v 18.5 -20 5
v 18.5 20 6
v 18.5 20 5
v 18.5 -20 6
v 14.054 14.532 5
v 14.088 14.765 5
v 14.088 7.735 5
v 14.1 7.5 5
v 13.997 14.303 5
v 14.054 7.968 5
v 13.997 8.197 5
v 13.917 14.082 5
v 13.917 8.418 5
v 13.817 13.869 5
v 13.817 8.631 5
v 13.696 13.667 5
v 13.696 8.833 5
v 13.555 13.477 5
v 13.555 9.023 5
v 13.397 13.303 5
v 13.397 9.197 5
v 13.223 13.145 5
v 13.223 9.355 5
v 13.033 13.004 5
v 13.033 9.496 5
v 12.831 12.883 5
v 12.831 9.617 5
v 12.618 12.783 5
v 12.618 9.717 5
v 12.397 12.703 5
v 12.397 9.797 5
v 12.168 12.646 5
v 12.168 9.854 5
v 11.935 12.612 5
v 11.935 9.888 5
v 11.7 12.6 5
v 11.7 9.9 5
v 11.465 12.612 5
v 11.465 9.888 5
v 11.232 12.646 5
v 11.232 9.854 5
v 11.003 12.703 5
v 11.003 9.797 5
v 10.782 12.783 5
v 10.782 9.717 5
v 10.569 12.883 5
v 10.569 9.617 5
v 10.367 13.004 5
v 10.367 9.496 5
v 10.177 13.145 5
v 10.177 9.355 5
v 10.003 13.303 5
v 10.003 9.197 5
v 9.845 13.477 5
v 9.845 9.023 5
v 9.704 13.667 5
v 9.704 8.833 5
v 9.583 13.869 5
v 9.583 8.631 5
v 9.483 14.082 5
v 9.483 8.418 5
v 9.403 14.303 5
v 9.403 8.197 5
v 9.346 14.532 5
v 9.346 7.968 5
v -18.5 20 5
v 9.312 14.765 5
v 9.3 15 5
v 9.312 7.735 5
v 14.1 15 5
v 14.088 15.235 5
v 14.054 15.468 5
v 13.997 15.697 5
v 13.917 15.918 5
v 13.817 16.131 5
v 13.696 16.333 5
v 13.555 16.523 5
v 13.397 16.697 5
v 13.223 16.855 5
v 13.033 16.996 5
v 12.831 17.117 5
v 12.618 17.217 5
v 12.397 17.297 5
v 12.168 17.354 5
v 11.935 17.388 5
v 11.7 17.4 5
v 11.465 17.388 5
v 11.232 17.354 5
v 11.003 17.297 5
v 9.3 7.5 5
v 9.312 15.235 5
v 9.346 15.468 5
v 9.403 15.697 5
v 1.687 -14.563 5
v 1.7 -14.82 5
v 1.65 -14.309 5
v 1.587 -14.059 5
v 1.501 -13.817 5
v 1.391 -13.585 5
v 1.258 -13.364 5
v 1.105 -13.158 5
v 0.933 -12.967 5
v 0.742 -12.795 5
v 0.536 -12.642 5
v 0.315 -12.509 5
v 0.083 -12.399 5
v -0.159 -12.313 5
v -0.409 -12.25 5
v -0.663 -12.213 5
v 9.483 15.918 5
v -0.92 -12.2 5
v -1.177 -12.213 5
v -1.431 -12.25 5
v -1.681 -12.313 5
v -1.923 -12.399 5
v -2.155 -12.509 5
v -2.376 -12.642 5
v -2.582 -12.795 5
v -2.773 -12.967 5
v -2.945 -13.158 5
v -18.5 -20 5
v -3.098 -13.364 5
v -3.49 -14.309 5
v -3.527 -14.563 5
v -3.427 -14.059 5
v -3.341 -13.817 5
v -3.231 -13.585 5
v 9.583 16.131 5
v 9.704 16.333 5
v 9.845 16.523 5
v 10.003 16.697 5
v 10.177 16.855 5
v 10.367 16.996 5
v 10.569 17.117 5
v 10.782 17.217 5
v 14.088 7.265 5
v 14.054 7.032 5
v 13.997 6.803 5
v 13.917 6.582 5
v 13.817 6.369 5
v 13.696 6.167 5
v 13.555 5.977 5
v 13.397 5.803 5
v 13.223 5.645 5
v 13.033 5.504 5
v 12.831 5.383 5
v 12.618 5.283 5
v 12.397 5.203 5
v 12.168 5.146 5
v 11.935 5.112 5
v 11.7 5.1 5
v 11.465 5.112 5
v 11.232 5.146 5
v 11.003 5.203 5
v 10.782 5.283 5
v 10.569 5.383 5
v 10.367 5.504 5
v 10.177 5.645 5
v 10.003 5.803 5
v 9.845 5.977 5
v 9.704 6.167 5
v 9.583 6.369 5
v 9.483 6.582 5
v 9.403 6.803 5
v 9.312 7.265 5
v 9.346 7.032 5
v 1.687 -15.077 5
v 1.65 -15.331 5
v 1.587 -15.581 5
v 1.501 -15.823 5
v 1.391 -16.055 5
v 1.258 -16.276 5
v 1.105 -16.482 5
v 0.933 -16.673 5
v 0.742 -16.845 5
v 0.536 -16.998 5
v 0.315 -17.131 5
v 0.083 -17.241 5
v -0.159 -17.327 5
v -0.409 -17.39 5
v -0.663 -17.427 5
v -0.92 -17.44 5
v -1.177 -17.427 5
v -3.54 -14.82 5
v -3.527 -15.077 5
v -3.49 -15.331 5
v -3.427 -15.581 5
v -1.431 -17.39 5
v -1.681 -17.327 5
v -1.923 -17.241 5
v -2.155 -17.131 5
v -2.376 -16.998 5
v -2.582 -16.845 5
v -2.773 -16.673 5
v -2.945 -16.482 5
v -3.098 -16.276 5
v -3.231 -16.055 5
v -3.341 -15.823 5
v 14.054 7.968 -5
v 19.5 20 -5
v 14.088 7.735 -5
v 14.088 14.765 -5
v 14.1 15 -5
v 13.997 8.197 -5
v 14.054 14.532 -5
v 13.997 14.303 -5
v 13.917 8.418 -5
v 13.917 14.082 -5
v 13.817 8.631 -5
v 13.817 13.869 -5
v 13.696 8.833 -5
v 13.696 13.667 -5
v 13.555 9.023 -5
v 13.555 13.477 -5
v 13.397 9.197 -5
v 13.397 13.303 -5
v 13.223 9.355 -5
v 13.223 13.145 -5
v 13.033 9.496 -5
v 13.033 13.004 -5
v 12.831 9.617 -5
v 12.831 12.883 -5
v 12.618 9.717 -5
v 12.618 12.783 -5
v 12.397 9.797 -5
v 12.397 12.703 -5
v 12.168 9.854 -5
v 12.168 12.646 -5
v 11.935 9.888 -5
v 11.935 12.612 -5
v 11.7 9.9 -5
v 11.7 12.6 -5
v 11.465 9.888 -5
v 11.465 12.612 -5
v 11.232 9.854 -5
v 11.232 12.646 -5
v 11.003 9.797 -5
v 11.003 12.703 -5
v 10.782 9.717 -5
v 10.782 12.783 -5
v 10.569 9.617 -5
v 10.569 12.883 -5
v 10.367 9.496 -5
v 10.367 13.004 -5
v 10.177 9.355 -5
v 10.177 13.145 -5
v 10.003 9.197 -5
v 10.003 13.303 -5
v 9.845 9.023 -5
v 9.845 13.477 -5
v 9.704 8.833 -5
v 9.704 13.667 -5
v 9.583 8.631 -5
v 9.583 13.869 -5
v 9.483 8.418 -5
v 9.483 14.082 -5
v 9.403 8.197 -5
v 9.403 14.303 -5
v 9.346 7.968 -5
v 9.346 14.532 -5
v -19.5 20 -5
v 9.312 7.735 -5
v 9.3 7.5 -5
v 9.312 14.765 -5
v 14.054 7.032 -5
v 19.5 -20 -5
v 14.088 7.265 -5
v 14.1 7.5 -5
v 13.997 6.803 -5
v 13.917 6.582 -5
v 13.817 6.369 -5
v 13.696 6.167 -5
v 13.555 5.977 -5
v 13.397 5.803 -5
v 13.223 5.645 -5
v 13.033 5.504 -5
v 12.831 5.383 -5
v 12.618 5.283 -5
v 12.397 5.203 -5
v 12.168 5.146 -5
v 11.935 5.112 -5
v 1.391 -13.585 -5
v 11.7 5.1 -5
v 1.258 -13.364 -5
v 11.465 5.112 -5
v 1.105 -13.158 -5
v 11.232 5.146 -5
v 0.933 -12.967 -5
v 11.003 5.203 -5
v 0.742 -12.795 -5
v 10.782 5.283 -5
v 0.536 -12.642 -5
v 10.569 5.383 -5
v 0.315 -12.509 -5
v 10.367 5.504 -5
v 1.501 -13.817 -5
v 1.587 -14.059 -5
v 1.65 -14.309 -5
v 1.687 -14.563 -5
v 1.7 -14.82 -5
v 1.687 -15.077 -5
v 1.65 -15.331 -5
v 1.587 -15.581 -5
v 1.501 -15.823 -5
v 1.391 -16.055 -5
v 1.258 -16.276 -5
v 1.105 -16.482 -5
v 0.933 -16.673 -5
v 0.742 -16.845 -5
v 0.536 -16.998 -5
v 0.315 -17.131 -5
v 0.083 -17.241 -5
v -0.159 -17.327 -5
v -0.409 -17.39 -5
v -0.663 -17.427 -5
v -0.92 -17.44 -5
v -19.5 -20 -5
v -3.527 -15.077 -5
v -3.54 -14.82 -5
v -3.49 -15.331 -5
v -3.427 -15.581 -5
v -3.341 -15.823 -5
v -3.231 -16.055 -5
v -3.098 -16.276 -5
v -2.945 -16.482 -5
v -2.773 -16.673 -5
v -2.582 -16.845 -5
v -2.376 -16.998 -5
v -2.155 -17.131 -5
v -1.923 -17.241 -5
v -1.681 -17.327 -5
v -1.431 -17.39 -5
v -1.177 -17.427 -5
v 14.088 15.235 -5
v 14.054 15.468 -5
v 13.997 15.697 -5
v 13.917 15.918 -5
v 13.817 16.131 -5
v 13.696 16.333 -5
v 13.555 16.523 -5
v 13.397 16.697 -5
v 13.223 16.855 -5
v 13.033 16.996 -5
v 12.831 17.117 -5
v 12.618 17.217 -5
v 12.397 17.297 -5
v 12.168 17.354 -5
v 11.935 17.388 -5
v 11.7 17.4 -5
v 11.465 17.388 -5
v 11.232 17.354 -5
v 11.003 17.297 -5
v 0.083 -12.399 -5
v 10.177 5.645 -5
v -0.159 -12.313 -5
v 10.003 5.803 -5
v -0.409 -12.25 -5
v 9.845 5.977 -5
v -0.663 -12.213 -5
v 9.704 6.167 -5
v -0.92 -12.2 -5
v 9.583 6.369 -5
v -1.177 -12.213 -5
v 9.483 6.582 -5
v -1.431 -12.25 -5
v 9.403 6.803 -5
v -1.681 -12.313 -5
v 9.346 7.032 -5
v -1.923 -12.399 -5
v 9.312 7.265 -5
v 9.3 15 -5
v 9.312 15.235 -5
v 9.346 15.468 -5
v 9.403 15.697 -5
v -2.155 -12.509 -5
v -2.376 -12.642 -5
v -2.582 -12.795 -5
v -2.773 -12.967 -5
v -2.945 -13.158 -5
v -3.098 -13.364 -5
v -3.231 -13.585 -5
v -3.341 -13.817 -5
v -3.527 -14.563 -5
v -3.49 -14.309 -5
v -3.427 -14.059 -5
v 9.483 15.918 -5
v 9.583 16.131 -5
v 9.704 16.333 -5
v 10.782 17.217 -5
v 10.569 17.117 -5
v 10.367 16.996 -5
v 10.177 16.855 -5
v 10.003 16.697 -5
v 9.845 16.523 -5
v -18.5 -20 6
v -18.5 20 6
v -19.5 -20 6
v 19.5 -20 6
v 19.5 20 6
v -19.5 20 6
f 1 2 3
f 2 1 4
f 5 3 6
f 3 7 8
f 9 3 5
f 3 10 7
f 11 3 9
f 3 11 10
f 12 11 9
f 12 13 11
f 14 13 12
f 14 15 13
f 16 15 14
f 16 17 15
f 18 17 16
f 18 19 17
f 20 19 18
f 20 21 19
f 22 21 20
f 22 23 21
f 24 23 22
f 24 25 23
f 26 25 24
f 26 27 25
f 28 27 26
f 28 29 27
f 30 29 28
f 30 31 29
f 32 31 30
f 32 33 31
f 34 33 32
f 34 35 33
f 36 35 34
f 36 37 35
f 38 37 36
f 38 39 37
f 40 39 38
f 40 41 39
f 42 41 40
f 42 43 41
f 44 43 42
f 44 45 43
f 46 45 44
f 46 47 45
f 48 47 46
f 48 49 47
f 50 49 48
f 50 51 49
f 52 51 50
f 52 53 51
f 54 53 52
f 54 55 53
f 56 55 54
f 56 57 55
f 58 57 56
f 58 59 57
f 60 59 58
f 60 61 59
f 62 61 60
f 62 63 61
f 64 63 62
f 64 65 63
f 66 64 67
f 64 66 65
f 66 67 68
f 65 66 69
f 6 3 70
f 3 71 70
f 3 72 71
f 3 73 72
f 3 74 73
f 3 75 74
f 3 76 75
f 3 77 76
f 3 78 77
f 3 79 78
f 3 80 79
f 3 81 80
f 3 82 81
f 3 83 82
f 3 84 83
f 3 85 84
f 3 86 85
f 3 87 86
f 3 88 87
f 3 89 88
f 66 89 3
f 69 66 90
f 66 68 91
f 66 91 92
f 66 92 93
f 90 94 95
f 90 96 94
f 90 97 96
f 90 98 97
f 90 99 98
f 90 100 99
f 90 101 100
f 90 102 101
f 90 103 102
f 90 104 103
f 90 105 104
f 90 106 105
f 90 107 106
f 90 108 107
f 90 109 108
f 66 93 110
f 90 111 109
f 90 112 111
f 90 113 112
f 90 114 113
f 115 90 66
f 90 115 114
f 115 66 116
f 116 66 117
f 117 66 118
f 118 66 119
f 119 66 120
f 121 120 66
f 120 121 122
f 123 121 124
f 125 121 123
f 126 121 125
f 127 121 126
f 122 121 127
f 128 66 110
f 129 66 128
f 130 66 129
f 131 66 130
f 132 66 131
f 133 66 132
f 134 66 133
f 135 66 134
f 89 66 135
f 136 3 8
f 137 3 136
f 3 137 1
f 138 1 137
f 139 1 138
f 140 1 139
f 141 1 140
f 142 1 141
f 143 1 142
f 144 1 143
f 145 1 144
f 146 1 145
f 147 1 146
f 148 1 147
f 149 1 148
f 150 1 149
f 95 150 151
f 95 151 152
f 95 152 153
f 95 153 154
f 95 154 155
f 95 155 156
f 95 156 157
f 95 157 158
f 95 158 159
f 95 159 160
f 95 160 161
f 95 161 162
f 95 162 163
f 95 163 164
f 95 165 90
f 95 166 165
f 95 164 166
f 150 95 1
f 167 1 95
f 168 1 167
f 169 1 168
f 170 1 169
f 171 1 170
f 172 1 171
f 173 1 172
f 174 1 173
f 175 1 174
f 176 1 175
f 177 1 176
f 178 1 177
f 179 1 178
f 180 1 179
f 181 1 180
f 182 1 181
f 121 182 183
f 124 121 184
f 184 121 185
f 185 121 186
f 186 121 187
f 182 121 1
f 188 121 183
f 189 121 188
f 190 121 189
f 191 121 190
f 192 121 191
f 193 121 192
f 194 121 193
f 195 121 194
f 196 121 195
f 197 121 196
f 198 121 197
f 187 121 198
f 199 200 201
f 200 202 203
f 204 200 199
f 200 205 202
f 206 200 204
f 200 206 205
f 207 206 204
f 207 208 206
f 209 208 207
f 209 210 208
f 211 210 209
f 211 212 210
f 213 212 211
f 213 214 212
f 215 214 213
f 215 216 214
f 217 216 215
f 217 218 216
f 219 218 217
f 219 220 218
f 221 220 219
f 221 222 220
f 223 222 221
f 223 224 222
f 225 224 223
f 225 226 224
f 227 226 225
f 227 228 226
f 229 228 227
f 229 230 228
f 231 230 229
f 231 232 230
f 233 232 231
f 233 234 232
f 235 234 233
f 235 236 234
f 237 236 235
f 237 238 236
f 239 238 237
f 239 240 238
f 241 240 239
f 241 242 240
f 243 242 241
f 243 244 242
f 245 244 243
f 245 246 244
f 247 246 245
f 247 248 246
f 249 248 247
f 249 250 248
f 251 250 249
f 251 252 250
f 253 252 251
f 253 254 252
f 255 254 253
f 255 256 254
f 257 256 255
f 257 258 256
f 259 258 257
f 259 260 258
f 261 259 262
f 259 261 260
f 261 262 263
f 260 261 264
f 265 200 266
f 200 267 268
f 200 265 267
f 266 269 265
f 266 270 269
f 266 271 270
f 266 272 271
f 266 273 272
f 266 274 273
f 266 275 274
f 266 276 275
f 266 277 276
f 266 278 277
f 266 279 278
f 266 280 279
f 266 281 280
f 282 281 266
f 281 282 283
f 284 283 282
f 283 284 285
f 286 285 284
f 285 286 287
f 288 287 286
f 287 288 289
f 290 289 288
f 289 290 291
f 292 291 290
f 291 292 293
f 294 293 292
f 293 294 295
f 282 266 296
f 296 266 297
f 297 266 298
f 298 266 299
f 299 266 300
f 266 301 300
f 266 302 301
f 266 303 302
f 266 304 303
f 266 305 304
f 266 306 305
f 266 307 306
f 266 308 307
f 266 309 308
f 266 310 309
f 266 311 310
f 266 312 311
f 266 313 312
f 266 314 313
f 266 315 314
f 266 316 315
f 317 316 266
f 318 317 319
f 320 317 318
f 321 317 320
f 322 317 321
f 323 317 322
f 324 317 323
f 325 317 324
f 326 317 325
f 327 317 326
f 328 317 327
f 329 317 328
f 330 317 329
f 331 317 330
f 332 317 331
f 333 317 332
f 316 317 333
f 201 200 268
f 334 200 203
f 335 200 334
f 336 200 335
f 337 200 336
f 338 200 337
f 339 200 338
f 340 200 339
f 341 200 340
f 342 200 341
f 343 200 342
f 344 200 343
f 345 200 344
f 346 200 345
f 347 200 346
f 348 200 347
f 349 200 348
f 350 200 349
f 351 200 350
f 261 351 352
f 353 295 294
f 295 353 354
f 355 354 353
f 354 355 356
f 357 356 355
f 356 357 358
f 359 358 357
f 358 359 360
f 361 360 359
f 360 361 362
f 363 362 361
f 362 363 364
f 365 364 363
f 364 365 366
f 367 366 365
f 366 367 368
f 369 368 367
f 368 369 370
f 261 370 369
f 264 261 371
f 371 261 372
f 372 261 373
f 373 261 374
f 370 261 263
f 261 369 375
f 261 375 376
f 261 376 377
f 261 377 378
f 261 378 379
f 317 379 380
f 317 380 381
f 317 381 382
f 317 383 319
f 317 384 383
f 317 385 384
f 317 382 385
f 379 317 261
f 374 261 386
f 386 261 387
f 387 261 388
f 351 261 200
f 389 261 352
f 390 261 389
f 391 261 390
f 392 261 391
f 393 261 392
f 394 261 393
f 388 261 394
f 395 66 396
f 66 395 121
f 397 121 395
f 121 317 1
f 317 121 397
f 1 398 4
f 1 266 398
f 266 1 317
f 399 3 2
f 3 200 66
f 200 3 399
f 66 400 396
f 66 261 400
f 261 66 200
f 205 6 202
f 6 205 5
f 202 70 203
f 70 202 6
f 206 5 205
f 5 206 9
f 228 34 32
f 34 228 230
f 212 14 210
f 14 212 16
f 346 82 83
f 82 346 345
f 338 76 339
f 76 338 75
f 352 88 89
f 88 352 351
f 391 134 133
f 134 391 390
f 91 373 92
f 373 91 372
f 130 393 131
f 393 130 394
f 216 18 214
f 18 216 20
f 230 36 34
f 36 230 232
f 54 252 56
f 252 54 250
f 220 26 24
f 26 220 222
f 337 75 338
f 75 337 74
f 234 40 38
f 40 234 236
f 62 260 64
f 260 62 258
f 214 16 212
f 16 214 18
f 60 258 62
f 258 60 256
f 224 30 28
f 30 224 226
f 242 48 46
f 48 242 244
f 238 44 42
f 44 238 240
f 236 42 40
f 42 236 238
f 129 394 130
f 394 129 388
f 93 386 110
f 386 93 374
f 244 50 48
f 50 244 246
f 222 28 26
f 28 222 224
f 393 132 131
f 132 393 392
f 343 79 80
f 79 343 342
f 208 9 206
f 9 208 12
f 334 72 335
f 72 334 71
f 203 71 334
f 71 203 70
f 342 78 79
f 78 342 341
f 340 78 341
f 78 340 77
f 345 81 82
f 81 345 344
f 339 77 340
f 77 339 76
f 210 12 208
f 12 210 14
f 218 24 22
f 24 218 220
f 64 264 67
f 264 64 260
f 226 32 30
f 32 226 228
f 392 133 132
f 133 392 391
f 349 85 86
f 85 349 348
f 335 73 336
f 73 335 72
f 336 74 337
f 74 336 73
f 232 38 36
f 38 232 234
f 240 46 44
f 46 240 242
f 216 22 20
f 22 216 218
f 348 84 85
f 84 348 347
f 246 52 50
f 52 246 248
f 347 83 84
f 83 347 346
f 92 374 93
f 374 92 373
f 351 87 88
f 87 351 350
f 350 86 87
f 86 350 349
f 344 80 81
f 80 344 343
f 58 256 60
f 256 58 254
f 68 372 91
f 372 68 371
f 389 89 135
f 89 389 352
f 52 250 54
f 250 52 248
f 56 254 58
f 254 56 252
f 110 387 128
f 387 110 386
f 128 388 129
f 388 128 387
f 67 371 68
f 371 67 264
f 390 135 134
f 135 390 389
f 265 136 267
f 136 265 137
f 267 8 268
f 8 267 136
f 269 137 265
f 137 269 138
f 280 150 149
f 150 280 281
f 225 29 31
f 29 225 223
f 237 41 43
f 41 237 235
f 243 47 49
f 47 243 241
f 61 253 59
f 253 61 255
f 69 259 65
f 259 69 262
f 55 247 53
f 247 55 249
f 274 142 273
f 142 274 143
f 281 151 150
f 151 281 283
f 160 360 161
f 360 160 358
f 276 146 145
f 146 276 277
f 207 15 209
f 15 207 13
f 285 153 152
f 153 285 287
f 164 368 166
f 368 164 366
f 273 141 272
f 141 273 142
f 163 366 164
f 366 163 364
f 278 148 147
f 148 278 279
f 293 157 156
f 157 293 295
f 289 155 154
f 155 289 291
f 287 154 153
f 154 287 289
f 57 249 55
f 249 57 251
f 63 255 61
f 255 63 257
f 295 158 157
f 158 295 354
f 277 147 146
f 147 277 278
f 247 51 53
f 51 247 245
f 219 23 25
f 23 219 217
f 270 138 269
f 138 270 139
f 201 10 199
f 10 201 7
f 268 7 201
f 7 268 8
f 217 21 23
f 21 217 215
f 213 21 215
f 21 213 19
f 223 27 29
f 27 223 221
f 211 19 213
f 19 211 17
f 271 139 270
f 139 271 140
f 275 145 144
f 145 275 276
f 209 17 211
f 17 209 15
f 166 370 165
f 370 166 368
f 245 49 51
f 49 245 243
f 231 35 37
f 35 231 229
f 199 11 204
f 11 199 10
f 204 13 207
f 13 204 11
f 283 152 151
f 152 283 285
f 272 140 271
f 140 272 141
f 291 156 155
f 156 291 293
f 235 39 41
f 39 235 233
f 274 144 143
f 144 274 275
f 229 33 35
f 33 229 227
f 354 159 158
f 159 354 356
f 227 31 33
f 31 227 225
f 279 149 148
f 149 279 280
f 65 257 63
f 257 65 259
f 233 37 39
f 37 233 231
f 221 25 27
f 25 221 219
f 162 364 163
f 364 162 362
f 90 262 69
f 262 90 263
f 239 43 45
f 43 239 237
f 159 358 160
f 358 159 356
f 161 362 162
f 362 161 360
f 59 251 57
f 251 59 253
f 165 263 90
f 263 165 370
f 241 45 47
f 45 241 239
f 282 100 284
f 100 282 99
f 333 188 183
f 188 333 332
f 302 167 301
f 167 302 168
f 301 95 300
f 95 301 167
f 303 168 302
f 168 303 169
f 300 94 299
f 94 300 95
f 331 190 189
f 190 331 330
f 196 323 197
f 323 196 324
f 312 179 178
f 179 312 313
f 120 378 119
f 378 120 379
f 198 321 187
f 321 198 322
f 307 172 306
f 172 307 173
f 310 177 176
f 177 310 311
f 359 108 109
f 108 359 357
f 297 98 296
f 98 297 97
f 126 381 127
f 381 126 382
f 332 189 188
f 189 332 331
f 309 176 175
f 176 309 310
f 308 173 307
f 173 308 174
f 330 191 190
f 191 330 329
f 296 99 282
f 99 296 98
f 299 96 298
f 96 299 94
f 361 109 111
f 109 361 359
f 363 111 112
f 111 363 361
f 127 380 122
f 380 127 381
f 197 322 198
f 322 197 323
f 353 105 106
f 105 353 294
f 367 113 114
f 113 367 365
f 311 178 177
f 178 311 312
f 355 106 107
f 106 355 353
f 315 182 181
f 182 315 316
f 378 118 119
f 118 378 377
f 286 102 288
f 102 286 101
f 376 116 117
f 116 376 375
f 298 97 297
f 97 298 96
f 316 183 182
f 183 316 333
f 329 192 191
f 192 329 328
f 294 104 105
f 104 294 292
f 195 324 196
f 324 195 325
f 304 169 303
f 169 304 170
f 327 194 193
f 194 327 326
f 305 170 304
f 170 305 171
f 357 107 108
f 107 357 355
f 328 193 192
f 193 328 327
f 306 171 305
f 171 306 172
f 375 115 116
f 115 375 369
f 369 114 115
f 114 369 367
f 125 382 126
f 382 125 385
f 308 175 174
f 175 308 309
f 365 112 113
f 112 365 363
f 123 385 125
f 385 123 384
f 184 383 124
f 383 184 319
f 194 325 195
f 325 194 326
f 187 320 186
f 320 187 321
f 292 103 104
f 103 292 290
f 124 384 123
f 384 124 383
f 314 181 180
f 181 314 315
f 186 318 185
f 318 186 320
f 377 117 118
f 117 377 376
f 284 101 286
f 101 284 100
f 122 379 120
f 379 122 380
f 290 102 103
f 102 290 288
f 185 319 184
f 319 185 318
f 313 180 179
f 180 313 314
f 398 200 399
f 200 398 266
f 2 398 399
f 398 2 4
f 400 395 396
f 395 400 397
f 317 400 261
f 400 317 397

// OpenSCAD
// file: FRpegEverbuilt.scad
railX=37.0;
railY=40;
railZ=10;
holeD=4.8;
holeX=railX/2-6.8;
hole1Y=-railY/2+5;
hole2Y=-railY/2+12.5;
frameThickness=1;

guardholeD=5.24;
guardholeX=railX/2-(16.8+guardholeD/2);
guardholeY=-railY/2+(32.2+guardholeD/2);

module FRpegEverbuilt()
{
difference() {
    cube([railX,railY,railZ],center=true);
    translate([holeX,hole1Y,0])cylinder(d=holeD,h=railZ+0.01,$fn=64,center=true);
    translate([holeX,hole2Y,0])cylinder(d=holeD,h=railZ+0.01,$fn=64,center=true);
    translate([guardholeX,guardholeY,0])cylinder(d=guardholeD,h=railZ+0.01,$fn=64,center=true);
}

//Frame
translate([railX/2+frameThickness/2,0,frameThickness/2])cube([frameThickness,railY,railZ+frameThickness],center=true);
translate([-railX/2-frameThickness/2,0,frameThickness/2])cube([frameThickness,railY,railZ+frameThickness],center=true);

}

FRpegEverbuilt();
// main file
use <FRpegEverbuilt.scad>

rotate([180,0,0])mirror([0,0,1])FRpegEverbuilt();
